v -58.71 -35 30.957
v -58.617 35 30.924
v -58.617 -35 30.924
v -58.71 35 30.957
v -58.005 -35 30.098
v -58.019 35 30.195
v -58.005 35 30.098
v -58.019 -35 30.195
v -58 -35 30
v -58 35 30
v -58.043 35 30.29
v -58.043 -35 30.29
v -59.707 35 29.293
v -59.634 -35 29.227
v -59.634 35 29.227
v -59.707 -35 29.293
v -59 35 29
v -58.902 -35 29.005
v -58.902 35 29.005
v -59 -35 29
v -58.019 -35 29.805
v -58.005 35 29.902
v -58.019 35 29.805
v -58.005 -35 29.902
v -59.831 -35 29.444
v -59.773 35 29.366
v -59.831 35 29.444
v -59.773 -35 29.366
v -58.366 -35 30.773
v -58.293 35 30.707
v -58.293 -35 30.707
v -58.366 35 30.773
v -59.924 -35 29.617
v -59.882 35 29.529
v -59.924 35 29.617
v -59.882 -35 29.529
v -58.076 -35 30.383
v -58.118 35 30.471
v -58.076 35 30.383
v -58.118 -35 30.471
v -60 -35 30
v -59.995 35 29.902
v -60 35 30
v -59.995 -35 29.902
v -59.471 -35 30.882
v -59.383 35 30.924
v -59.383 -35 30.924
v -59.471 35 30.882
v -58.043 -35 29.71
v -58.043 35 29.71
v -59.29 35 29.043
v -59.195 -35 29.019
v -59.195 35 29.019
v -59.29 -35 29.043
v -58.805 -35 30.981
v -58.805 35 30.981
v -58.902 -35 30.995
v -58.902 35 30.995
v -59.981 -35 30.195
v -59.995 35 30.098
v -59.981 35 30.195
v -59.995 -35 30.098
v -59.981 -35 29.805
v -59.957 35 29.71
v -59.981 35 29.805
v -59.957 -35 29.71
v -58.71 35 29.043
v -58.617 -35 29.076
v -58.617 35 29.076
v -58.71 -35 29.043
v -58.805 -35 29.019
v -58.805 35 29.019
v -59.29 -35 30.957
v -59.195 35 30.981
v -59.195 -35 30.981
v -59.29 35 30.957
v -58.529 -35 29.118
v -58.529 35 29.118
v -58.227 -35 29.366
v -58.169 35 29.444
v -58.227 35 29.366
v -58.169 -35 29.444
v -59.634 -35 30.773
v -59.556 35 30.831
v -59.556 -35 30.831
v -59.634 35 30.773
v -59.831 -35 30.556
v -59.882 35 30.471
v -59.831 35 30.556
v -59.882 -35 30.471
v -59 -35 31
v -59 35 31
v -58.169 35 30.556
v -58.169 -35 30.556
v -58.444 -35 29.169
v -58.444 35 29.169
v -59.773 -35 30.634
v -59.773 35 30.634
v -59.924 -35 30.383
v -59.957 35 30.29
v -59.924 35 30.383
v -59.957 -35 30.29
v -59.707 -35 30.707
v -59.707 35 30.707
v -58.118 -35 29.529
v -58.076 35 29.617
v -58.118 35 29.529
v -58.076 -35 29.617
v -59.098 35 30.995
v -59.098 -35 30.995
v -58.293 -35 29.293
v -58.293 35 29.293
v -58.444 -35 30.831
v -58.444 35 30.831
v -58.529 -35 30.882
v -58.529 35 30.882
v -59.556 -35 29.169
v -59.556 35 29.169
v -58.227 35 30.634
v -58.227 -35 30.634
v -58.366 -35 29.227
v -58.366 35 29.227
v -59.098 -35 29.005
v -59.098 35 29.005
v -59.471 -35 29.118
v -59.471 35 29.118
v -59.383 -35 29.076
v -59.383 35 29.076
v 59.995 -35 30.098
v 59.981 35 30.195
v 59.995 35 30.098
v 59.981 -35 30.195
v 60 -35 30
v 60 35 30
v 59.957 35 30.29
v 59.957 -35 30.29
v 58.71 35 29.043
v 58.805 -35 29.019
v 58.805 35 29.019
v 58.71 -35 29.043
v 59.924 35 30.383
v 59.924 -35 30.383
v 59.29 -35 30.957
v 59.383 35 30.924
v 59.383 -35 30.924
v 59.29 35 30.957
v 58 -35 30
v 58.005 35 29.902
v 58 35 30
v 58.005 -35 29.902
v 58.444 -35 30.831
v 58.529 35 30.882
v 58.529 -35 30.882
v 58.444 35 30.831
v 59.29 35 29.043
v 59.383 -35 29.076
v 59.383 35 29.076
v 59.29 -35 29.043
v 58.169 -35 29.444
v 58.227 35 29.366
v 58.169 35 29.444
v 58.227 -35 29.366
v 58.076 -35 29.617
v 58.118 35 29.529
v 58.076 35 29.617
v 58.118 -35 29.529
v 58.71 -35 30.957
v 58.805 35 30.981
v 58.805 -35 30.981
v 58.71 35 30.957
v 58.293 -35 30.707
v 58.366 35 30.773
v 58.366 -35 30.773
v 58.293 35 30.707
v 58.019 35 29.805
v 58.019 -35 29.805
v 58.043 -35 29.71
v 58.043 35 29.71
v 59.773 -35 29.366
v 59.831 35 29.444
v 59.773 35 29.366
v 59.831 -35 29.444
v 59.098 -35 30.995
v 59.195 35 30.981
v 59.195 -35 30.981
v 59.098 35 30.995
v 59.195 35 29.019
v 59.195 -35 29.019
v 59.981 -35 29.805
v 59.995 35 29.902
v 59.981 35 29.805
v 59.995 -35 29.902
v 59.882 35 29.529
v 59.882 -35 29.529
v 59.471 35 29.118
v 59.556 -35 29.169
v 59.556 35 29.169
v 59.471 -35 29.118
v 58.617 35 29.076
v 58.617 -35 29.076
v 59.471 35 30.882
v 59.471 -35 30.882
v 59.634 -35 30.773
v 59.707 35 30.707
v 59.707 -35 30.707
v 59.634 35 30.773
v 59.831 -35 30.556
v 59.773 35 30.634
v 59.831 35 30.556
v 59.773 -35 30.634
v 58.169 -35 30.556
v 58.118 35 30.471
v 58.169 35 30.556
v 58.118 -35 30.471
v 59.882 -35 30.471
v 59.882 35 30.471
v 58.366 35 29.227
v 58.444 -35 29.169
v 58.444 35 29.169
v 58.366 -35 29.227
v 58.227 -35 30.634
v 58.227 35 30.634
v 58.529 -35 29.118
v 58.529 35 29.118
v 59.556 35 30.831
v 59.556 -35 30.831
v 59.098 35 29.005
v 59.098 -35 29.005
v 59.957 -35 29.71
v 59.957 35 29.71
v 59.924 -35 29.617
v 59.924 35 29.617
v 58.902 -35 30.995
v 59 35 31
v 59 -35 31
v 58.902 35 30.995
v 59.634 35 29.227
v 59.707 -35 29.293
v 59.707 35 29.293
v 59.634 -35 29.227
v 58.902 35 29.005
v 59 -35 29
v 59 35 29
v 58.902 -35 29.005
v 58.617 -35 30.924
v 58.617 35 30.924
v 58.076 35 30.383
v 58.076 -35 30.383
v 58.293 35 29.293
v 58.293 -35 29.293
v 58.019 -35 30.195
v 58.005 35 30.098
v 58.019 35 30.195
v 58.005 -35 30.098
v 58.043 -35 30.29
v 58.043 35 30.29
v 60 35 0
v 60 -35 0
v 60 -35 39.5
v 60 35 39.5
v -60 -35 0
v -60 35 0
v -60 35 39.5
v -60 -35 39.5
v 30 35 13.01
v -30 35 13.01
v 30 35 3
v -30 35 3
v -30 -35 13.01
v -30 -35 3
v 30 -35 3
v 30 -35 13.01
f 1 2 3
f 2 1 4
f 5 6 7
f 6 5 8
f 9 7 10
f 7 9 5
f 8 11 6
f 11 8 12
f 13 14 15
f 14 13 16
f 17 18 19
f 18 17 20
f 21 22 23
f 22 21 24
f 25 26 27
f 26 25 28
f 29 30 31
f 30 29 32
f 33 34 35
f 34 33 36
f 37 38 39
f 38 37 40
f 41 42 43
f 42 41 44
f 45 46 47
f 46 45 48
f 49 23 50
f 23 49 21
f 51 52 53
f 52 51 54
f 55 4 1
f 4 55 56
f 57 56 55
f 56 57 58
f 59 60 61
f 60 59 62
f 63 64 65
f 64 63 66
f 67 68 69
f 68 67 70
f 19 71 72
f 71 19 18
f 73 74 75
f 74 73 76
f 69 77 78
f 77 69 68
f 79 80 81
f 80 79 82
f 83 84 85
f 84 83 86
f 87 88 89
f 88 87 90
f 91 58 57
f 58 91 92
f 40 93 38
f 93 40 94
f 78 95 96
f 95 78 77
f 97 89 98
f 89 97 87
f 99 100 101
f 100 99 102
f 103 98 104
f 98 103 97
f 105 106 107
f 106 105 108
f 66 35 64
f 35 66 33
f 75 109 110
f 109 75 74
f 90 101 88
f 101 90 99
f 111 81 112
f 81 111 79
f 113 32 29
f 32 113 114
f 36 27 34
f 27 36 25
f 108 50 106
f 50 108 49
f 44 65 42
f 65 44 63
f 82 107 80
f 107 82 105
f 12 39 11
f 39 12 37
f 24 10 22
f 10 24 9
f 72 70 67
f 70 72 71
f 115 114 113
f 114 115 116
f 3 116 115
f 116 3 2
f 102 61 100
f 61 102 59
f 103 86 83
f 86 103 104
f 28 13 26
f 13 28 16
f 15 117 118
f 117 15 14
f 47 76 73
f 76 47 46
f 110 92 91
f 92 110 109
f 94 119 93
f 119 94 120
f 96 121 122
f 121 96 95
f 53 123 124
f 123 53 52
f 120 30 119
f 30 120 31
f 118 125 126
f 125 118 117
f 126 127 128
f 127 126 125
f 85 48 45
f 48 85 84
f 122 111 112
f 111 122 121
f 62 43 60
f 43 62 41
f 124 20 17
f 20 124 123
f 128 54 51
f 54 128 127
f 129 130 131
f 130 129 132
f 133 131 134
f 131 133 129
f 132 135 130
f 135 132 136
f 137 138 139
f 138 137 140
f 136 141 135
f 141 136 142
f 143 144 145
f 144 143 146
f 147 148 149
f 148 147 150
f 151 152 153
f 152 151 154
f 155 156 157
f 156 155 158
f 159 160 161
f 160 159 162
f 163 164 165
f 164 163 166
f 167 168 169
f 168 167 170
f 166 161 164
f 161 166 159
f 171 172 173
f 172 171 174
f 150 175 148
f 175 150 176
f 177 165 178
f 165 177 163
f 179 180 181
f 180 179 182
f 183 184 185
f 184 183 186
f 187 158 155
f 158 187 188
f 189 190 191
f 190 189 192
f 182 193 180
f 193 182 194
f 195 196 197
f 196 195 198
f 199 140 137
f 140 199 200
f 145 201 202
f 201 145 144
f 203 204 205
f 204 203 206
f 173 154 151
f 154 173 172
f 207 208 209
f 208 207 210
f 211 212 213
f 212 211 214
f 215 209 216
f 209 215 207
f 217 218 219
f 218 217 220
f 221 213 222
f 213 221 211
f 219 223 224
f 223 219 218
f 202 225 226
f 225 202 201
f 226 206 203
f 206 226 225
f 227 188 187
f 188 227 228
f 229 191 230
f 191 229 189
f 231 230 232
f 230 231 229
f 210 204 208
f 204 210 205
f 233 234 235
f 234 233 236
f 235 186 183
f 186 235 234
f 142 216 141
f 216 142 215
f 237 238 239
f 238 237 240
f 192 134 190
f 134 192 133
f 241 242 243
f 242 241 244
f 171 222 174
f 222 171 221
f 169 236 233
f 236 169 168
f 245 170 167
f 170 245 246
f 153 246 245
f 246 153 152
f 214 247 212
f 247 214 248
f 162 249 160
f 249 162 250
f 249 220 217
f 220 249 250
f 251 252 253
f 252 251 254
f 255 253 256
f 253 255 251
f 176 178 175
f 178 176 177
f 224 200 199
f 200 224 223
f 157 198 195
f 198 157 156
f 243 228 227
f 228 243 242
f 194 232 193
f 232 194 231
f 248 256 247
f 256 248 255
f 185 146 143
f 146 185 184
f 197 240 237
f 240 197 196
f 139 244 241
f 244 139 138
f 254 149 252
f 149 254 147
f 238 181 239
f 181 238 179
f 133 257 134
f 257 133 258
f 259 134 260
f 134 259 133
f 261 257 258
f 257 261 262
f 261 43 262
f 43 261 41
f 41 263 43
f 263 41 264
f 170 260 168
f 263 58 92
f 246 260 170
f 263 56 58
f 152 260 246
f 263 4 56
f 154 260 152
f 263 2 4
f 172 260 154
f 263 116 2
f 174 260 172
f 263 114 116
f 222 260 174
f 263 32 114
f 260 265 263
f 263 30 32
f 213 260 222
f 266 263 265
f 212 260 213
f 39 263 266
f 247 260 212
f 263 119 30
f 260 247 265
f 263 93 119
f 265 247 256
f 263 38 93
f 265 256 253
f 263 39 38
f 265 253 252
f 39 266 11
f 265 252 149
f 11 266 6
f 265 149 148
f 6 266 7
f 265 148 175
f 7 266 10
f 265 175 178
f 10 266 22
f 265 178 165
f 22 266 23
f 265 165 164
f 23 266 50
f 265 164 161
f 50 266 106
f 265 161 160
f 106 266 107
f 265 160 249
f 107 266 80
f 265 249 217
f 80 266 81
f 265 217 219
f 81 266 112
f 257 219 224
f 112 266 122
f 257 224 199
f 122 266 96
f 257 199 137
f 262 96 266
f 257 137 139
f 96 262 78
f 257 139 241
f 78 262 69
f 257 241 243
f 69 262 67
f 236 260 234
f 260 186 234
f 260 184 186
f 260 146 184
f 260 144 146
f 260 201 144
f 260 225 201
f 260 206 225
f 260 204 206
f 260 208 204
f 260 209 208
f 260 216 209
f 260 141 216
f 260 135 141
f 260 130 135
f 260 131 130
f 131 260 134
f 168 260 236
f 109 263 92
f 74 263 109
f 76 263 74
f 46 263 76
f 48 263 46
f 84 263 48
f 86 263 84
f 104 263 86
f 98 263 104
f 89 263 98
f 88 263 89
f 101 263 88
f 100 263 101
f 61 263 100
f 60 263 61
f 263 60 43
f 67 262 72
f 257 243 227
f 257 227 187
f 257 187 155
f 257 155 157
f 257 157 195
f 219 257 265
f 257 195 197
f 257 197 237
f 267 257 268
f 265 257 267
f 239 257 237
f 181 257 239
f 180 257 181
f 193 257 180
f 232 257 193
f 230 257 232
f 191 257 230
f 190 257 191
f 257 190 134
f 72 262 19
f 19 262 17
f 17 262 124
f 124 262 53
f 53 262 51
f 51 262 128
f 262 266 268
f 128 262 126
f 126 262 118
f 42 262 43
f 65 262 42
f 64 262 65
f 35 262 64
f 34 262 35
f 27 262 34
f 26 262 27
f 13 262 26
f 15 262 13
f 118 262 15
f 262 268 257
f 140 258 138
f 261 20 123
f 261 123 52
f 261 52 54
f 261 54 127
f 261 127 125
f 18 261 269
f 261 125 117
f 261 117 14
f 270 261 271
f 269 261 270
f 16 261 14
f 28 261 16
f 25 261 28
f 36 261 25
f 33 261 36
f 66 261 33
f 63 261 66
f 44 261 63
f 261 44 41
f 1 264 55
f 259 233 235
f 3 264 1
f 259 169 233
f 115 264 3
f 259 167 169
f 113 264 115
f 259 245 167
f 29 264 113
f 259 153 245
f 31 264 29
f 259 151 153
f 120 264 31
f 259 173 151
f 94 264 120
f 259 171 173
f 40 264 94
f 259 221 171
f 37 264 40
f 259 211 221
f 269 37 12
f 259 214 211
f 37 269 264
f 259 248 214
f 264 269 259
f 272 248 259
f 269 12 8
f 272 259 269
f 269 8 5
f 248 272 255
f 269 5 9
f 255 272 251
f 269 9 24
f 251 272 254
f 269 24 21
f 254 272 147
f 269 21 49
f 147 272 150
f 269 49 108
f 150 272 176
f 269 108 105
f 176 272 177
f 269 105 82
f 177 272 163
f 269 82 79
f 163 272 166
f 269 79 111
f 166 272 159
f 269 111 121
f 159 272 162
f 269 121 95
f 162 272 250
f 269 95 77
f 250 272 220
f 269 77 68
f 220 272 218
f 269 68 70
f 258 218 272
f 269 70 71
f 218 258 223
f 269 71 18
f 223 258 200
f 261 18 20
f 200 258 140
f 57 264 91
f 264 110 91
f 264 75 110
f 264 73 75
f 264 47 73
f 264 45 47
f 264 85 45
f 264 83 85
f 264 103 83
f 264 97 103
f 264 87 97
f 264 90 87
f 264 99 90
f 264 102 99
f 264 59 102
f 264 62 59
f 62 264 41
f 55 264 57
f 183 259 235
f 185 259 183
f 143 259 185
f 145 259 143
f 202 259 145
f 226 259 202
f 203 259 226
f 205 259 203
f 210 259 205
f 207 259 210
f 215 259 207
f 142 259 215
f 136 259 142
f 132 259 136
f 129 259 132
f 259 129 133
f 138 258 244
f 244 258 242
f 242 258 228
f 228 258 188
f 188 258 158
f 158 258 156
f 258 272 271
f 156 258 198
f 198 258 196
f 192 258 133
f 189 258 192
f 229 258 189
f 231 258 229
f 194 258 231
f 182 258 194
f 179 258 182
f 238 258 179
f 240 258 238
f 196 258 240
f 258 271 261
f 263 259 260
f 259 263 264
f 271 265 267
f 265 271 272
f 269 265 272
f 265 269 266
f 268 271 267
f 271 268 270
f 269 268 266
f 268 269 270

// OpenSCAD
// Mini horizontal gel-electrophoresis box - buffer tank
// Print orientation: base on XY plane, open top facing +Z

// ---- Tank dimensions ----
outer_x = 120;   // outer length in X
outer_y = 70;    // outer width in Y (inner width)
height  = 40;    // overall height in Z
wall    = 3;     // wall thickness
floor   = 3;     // floor thickness

// ---- Platform ----
plat_len   = 60; // platform length in X
plat_top_z = 13; // top of platform (10 mm above inner floor)

// ---- Holes ----
hole_d     = 2;  // electrode wire hole diameter
hole_y     = 0;  // hole Y position
hole_z     = 30; // hole Z position

// ---- Misc ----
eps        = 0.5; // cutter overshoot
$fn        = 64;

difference() {
    // Tank body
    translate([-outer_x/2, -outer_y/2, 0])
        cube([outer_x, outer_y, height]);

    // Open top
    translate([-outer_x/2 - eps, -outer_y/2 - eps, height - eps])
        cube([outer_x + 2*eps, outer_y + 2*eps, eps]);

    // Platform
    translate([-plat_len/2, -outer_y/2, floor])
        cube([plat_len, outer_y, plat_top_z - floor + 0.01]);

    // Holes
    for (sx = [-1, 1])
        translate([sx * (outer_x/2 - 1), hole_y, hole_z])
            rotate([90, 0, 0])
                cylinder(d = hole_d, h = outer_x + 2, center = true);
}
